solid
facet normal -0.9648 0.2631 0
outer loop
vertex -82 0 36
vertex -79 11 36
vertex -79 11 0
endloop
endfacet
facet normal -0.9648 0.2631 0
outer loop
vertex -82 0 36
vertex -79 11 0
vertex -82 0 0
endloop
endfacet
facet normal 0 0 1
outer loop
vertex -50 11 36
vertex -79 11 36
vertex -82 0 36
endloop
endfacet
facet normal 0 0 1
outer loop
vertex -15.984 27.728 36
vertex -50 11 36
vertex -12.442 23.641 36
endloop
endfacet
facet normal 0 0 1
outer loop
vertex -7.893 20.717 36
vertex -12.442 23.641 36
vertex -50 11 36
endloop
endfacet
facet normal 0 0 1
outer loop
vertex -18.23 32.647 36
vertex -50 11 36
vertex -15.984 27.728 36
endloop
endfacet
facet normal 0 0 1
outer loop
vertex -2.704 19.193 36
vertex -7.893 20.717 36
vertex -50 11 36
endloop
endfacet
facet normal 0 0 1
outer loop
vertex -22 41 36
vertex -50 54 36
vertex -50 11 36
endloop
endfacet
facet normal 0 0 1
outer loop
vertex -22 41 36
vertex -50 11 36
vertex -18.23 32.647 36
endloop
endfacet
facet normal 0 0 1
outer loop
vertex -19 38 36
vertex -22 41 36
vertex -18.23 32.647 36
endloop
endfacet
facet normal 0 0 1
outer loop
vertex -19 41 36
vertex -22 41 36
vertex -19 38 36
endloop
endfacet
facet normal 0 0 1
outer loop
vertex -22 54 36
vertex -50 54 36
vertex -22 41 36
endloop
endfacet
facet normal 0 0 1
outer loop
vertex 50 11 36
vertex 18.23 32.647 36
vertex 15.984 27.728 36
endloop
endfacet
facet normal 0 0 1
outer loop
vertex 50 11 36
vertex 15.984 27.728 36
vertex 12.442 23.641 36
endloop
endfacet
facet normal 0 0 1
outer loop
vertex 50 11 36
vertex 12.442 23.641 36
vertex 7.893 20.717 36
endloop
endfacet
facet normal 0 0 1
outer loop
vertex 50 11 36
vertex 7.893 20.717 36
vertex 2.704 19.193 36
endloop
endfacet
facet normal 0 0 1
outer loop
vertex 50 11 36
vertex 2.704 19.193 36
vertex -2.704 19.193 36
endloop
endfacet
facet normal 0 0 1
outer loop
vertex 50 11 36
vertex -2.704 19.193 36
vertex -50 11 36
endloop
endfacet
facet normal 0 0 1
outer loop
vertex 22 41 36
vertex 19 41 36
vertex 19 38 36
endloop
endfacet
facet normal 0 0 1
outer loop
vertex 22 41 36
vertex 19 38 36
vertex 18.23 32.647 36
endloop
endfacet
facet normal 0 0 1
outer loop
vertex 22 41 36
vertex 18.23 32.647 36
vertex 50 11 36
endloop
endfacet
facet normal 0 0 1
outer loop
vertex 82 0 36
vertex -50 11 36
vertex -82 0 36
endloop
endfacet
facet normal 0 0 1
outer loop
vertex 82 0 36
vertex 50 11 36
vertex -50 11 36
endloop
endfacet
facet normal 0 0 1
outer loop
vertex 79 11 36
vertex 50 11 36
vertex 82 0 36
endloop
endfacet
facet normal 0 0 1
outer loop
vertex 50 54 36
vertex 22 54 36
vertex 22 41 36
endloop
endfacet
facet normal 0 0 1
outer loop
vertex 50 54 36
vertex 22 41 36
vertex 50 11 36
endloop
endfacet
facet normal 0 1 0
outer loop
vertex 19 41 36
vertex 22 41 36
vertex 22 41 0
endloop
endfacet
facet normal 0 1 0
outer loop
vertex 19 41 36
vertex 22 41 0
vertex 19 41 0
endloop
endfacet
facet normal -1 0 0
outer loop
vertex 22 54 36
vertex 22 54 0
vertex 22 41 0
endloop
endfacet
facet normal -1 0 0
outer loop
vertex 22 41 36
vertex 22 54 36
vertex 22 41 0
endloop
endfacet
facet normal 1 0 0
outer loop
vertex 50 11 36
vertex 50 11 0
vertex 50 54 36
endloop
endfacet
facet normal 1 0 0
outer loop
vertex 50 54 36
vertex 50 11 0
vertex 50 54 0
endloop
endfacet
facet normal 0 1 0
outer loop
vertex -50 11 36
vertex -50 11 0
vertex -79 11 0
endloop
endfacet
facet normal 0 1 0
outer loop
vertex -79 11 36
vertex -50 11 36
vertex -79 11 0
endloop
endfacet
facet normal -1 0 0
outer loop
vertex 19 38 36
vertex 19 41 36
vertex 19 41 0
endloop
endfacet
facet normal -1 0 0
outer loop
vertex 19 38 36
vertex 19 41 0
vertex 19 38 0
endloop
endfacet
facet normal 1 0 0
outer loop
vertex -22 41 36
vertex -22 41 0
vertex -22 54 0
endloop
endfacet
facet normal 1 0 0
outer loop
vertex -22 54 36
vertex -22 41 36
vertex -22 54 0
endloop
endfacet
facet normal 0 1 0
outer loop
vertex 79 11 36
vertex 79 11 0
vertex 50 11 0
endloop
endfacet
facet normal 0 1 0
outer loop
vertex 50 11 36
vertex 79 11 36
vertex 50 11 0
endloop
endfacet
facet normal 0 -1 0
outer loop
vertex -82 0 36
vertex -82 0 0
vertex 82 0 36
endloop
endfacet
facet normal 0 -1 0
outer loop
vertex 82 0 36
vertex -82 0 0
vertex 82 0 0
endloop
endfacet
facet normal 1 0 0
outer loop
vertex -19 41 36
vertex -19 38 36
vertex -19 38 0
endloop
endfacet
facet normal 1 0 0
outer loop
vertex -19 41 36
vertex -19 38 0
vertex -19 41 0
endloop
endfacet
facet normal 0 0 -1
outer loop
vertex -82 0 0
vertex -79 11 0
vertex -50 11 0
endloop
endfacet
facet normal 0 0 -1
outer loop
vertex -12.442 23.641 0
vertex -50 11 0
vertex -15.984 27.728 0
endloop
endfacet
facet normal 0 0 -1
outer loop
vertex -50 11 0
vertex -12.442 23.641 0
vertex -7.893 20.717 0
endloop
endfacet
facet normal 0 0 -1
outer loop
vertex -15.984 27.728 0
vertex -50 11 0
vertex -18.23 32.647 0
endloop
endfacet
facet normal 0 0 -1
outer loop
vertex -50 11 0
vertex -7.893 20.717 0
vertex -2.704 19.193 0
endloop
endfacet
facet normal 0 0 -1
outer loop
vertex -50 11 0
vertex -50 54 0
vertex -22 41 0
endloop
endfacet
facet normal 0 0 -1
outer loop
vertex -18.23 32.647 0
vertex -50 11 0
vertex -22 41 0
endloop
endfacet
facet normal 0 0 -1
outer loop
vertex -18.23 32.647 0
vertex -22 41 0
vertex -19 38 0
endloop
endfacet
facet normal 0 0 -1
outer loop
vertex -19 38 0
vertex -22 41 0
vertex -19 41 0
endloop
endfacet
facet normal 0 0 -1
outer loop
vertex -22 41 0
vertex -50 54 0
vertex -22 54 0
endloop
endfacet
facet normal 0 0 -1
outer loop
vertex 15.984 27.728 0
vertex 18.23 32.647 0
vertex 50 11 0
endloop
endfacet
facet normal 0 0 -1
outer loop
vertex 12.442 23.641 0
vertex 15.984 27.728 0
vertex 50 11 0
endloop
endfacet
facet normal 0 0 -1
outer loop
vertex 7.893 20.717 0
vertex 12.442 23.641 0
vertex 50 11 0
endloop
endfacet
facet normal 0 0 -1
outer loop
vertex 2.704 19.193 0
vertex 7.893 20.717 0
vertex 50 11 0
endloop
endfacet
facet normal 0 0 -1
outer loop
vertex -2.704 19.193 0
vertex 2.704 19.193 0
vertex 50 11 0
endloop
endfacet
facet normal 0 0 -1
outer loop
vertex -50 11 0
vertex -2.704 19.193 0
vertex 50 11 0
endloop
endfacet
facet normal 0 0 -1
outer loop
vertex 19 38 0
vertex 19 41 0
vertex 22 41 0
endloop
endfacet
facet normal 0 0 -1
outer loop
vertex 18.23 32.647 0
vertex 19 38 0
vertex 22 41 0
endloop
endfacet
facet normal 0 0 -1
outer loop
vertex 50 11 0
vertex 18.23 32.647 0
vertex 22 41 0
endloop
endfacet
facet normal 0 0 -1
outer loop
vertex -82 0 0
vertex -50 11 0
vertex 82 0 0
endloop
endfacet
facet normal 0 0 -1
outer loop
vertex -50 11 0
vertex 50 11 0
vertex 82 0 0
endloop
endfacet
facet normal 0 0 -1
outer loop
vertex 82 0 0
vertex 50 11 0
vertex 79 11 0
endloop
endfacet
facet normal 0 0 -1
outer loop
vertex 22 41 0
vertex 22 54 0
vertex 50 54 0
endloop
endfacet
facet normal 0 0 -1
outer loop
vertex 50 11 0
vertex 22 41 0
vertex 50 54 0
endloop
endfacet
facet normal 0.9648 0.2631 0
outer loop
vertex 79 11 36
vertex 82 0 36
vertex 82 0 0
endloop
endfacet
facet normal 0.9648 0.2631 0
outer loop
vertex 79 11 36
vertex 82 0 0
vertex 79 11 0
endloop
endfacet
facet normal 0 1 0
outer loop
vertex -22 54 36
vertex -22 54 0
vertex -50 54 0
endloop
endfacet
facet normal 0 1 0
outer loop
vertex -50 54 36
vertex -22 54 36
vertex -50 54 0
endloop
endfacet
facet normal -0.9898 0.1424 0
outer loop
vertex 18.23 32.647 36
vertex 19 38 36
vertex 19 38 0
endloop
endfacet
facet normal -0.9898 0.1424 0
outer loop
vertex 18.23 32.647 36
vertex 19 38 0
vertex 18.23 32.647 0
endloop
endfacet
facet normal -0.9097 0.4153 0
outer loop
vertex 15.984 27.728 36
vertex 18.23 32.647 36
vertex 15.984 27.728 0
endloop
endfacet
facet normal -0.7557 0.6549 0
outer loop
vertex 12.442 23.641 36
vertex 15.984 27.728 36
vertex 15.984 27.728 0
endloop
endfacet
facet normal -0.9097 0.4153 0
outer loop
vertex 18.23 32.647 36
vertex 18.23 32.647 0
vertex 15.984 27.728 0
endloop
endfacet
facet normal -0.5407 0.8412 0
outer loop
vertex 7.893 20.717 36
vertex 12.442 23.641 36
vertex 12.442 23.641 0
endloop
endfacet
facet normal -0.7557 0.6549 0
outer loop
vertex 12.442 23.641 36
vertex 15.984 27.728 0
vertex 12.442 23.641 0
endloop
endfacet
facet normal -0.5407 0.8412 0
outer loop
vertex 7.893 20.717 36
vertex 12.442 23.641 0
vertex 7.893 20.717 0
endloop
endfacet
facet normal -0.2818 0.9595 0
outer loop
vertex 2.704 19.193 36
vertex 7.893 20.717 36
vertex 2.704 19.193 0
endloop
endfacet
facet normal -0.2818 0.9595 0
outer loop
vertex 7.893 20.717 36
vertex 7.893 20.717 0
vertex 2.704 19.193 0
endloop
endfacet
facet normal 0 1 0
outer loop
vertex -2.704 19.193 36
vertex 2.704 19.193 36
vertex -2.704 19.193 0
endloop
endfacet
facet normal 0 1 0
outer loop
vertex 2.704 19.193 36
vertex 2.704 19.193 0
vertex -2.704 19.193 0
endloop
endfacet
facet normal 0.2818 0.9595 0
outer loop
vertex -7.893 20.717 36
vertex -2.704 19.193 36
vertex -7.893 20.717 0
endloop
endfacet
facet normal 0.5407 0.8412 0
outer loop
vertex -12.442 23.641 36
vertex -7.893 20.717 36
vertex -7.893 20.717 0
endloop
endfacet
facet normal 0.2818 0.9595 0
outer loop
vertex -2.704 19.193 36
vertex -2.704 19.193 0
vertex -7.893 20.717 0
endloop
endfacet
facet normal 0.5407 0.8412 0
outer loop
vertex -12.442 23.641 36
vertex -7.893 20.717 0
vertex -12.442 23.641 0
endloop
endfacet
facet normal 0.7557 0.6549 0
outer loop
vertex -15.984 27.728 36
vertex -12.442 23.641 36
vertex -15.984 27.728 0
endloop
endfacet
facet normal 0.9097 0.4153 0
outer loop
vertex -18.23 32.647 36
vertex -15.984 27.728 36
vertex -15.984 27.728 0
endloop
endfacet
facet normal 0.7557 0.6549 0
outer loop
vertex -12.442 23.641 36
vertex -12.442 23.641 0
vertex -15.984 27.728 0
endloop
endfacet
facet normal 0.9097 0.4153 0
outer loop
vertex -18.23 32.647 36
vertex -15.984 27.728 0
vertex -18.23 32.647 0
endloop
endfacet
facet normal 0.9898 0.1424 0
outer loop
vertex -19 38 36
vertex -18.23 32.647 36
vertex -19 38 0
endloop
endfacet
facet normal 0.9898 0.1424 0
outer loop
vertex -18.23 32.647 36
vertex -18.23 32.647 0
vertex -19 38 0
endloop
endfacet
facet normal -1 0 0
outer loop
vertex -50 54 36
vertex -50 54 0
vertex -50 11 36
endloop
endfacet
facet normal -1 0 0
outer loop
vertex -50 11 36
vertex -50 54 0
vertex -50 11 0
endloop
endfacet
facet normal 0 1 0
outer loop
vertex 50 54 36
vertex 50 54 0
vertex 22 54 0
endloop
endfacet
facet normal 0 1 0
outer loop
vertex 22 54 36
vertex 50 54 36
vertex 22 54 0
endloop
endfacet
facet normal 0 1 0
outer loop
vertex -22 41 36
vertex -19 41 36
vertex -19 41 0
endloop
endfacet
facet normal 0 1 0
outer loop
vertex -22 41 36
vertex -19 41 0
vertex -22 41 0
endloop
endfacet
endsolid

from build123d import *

# Parameters (mm, degrees)
BOSS_EXTRUDE2_DEPTH = 36


with BuildPart() as part:
    # Sketch1 → Boss-Extrude2 (new body)
    with BuildSketch(Plane.XY):
        with BuildLine():
            Line((-82, 0), (82, 0))
            Line((82, 0), (79, 11))
            Line((79, 11), (50, 11))
            Line((50, 11), (50, 54))
            Line((50, 54), (22, 54))
            Line((22, 54), (22, 41))
            Line((22, 41), (19, 41))
            Line((19, 41), (19, 38))
            ThreePointArc((19, 38), (0, 19), (-19, 38))
            Line((-19, 38), (-19, 41))
            Line((-19, 41), (-22, 41))
            Line((-22, 41), (-22, 54))
            Line((-22, 54), (-50, 54))
            Line((-50, 54), (-50, 11))
            Line((-50, 11), (-79, 11))
            Line((-79, 11), (-82, 0))
        make_face()
    extrude(amount=BOSS_EXTRUDE2_DEPTH)


solid = part.part
